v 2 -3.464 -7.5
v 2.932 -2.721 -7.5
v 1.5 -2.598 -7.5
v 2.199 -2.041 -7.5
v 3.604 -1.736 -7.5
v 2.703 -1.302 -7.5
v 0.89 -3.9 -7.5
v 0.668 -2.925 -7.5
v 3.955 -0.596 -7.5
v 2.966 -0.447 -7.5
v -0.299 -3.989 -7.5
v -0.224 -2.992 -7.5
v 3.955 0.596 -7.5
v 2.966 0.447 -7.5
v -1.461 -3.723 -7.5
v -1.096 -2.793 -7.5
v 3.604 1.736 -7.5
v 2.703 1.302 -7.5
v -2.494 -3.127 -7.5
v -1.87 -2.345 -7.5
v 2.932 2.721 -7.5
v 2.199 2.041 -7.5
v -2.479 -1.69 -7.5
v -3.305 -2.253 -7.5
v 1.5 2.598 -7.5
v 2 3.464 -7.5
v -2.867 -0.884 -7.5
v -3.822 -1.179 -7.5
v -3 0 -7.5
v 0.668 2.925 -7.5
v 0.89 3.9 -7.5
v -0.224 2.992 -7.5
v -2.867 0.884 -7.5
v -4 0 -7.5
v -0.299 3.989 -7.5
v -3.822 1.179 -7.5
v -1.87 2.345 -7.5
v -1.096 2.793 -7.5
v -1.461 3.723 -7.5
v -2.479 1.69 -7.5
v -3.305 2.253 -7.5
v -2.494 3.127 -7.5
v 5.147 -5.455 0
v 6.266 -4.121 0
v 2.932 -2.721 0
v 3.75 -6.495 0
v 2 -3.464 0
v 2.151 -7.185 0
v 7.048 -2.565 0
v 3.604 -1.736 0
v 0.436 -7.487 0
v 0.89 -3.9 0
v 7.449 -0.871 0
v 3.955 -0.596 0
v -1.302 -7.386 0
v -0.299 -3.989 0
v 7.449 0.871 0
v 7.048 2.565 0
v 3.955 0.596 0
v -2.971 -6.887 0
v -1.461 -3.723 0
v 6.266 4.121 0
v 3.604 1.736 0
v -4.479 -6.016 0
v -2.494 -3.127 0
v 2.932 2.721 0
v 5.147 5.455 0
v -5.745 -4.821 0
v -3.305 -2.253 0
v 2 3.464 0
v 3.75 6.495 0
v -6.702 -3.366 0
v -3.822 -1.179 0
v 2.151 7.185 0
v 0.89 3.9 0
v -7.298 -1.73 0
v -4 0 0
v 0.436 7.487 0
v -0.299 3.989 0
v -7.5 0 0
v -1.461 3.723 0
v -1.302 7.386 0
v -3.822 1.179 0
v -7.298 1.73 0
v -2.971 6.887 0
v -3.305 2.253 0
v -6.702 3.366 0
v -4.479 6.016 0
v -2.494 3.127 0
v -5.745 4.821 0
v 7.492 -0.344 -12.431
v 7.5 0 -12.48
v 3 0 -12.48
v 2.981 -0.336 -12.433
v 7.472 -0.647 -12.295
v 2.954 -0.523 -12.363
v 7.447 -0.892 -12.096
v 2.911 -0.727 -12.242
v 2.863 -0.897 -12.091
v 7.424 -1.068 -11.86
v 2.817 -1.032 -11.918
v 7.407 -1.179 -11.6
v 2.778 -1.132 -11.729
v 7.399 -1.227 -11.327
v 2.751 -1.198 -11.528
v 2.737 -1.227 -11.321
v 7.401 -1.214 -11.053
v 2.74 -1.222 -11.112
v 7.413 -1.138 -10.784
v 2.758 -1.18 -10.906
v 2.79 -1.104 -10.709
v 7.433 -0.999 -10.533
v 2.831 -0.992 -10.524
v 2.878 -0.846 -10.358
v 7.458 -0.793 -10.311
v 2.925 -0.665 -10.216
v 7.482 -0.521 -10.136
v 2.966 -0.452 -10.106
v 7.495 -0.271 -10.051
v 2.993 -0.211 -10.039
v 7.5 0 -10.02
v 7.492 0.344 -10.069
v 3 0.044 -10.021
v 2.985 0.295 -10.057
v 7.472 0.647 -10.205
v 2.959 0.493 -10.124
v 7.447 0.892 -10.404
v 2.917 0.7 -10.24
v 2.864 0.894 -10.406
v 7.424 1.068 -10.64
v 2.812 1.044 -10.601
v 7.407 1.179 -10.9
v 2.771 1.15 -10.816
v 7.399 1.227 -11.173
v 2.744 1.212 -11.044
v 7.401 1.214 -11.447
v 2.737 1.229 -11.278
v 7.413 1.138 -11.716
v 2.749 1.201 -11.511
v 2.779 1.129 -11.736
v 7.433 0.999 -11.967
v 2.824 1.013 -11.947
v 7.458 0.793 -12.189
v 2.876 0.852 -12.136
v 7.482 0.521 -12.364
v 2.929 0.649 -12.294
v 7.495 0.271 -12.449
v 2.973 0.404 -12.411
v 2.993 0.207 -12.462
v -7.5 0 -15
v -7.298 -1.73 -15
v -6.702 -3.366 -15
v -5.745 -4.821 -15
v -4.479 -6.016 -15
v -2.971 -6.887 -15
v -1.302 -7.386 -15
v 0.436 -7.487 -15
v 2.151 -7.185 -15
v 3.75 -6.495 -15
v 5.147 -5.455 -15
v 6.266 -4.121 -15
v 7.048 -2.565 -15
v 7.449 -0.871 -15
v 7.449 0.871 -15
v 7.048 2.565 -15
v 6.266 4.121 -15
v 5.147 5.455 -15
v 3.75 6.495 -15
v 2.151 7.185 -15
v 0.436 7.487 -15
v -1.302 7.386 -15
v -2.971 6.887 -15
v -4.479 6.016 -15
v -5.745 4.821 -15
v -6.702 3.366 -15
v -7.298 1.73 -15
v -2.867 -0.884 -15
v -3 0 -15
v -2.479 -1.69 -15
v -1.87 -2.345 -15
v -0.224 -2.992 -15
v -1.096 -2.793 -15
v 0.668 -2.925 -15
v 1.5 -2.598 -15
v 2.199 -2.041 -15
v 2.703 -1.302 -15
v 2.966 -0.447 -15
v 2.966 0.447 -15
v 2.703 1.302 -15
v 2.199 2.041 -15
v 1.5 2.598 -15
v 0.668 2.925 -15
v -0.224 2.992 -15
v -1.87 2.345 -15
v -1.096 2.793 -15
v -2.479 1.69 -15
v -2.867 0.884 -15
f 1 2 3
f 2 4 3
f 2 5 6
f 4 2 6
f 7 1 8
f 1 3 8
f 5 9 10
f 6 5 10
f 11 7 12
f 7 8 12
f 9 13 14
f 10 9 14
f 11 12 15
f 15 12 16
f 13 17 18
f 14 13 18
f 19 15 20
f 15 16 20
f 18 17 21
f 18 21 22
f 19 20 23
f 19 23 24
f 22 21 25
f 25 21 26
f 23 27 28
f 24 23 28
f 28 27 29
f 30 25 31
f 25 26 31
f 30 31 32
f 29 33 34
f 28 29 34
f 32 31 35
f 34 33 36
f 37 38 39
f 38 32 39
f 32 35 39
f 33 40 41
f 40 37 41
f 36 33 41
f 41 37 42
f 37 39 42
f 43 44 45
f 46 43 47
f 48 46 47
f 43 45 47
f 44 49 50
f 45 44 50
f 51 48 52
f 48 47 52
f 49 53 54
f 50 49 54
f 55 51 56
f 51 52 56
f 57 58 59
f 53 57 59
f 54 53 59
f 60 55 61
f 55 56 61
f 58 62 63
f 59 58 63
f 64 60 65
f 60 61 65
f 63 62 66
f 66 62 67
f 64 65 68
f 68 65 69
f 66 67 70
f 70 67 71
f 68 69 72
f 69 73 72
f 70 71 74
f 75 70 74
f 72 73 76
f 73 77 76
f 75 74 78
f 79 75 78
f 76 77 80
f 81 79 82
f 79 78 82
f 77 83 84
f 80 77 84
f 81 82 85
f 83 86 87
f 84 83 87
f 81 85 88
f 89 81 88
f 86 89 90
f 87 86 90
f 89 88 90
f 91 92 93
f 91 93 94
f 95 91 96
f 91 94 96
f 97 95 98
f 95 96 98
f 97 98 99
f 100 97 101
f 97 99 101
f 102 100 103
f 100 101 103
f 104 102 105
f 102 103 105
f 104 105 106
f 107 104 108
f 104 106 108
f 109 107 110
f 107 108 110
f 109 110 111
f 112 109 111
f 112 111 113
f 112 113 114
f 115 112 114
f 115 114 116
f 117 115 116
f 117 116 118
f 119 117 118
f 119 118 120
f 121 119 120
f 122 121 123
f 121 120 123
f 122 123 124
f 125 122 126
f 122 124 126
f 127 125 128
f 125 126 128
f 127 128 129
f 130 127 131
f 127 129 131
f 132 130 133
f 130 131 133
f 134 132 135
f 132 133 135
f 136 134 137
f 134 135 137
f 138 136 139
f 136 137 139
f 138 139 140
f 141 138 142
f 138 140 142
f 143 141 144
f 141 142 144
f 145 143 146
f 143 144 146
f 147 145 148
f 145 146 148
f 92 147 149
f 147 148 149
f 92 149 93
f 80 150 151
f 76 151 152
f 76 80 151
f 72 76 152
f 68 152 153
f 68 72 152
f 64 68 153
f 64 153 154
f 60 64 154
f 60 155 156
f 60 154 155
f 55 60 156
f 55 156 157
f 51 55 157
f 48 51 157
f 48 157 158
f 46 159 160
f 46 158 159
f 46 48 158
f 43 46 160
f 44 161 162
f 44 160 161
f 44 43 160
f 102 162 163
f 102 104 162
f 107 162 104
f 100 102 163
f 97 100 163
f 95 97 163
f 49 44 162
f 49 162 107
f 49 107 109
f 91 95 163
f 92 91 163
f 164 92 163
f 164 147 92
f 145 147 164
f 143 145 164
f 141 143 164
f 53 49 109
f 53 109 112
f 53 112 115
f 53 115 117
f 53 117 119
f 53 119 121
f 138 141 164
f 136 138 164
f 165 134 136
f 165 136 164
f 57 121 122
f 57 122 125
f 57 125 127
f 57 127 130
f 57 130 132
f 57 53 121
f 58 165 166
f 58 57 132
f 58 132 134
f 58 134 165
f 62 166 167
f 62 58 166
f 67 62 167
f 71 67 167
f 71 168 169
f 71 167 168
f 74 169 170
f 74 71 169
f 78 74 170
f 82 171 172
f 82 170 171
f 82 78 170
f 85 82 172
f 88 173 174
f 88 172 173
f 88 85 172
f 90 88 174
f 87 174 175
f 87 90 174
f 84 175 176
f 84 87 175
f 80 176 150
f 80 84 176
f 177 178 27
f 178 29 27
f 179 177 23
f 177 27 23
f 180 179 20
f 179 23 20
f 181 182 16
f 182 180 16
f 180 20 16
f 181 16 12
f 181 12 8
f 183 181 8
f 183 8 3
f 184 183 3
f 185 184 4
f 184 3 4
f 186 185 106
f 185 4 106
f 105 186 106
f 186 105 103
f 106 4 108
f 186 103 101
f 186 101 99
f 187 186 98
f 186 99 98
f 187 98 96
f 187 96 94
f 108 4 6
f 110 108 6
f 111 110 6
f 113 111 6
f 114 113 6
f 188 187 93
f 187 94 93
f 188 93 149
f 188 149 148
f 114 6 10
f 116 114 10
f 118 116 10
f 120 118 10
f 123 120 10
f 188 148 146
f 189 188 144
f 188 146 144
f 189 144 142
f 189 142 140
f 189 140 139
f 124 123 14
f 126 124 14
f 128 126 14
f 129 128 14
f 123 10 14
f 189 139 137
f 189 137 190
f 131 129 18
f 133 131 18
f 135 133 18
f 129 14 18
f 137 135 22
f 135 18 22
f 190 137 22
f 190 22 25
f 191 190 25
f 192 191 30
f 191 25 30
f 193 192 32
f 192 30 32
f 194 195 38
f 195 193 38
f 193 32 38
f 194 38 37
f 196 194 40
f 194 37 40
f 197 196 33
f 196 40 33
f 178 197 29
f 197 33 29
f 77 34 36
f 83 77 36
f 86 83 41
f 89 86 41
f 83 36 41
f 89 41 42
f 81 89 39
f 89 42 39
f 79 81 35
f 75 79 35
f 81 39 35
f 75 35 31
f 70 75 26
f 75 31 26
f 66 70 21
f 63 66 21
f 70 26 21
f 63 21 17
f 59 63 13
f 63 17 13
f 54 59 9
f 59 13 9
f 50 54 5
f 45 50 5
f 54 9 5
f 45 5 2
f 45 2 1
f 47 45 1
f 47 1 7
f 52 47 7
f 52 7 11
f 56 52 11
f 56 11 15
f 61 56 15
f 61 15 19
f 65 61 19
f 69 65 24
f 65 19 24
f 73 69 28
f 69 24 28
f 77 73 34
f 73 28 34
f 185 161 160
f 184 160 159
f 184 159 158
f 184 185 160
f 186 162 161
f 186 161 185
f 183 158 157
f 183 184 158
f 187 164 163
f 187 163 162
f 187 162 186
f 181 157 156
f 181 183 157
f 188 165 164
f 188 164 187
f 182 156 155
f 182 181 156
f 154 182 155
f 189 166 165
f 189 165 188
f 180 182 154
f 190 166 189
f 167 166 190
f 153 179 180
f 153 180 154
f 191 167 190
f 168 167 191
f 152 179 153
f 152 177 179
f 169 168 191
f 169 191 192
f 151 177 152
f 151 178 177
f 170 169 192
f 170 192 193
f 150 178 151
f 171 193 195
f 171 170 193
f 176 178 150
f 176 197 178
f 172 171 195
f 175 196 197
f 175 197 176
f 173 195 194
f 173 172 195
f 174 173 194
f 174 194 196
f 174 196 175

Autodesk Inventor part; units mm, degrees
ref_plane "XZ Plane" through (0, 0, 0) normal (0, 1, 0) x (-1, 0, 0)
ref_plane "XY Plane" through (0, 0, 0) normal (0, 0, 1) x (1, 0, 0)
sketch "Skizze1" plane through (0, 0, 0) normal (0, 1, 0) x (-1, 0, 0)
  line L0 (4, 0) -> (4, -7.5)
  line L1 (4, -7.5) -> (3, -7.5)
  line L2 (7.5, -15) -> (7.5, 0)
  line L3 (7.5, 0) -> (4, 0)
  line L4 (0, 3.7992) -> (0, -25.1489)
  line L5 (7.5, -15) -> (3, -15)
  line L6 (3, -15) -> (3, -10)
  line L7 (3, -10) -> (3, -10)
  line L8 (3, -10) -> (3, -7.5)
  point P0 (0, 0)
  dimension "d6" = 4
  dimension "d9" = 4.5
  dimension "d10" = 5
  dimension "d15" = 6
  dimension "d16" = 15
  dimension "d17" = 7.5
  dimension "d18" = 15
revolve "Umdrehung1" add sketch "Skizze1" angle 360 about axis through (0, 0, 3.7992) along (0, 0, -1)
thread "Gewinde1" size "M6x1" class "6H" standard "ANSI Metric M Profile" full length
thread "Gewinde2" size "M8x1.25" class "6H" standard "ANSI Metric M Profile" full length
ref_plane "Arbeitsebene1" through (7.5, 0, 0) normal (1, 0, 0) x (0, 1, 0)
sketch "Skizze3" plane through (7.5, 0, 0) normal (1, 0, 0) x (0, 1, 0)
  line L0 (-4, -7.5) -> (4, -7.5) projected
  line L1 (-7.5, -15) -> (7.5, -15) projected
  line L2 (0, 0) -> (0, -15)
  line L3 (-3, -15) -> (3, -15) projected
  point P0 (0, -11.25)
  dimension "d20" = 3.75
hole "Bohrung1" at (7.5, 0, -11.25) direction (-1, 0, 0) diameter 2.459 end up to surface thread size "M3x0.5" class "6H" standard "ISO Metric profile"
properties part number "Glasdeckel"
